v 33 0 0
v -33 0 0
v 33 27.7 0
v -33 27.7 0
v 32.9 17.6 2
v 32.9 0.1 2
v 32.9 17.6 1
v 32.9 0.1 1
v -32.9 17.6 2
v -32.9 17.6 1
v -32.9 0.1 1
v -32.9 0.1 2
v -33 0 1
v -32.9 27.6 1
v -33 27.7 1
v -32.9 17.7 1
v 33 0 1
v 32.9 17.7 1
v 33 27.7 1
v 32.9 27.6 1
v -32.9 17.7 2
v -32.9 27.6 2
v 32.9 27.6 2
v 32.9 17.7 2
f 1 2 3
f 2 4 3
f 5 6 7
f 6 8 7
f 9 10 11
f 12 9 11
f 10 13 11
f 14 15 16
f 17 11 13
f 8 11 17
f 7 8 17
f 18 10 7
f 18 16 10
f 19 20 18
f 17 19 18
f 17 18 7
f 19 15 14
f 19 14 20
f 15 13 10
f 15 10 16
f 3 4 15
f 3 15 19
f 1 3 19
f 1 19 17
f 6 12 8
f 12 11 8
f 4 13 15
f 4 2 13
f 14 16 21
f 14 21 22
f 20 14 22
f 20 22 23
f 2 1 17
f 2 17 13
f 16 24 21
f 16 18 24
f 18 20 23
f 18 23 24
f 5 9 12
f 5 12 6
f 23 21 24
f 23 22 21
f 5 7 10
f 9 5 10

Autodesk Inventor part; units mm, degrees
ref_plane "YZ Plane" through (0, 0, 0) normal (1, 0, 0) x (0, 1, 0)
ref_plane "XZ Plane" through (0, 0, 0) normal (0, 1, 0) x (-1, 0, 0)
ref_plane "XY Plane" through (0, 0, 0) normal (0, 0, 1) x (1, 0, 0)
sketch "スケッチ1" plane through (0, 0, 0) normal (0, 0, 1) x (1, 0, 0)
  line L0 (-33, 27.7) -> (33, 27.7)
  line L1 (33, 27.7) -> (33, 0)
  line L2 (33, 0) -> (-33, 0)
  line L3 (-33, 0) -> (-33, 27.7)
  point P0 (0, 0)
  point P1 (0, 0)
  dimension "d0" = 66
  dimension "d1" = 27.7
extrude "押し出し1" add sketch "スケッチ1" along normal blind 1
sketch "スケッチ5" plane through (0, 0, 1) normal (0, 0, 1) x (1, 0, 0)
  line L0 (-32.9, 0.1) -> (32.9, 0.1)
  line L1 (32.9, 0.1) -> (32.9, 17.6)
  line L2 (32.9, 17.6) -> (-32.9, 17.6)
  line L3 (-32.9, 17.6) -> (-32.9, 0.1)
  line L4 (32.9, 17.7) -> (-32.9, 17.7)
  line L5 (-32.9, 17.7) -> (-32.9, 27.6)
  line L6 (-32.9, 27.6) -> (32.9, 27.6)
  line L7 (32.9, 27.6) -> (32.9, 17.7)
  line L8 (-33, 27.7) -> (-33, 0) projected
  line L9 (33, 27.7) -> (-33, 27.7) projected
  line L10 (33, 0) -> (33, 27.7) projected
  line L11 (-33, 0) -> (33, 0) projected
  point P0 (0, 0)
  dimension "d14" = 0.1
  dimension "d15" = 0.1
  dimension "d16" = 0.1
  dimension "d17" = 0.1
  dimension "d18" = 0.1
  dimension "d19" = 9.9
extrude "押し出し4" add sketch "スケッチ5" along normal blind 1 contours L3 L2 L1 L0 | L4 L5 L6 L7
equation "\"d15\" = d14"
equation "\"d16\" = d14"
equation "\"d17\" = d14"
equation "\"d18\" = d14"
properties part number "AQM1602XA"
